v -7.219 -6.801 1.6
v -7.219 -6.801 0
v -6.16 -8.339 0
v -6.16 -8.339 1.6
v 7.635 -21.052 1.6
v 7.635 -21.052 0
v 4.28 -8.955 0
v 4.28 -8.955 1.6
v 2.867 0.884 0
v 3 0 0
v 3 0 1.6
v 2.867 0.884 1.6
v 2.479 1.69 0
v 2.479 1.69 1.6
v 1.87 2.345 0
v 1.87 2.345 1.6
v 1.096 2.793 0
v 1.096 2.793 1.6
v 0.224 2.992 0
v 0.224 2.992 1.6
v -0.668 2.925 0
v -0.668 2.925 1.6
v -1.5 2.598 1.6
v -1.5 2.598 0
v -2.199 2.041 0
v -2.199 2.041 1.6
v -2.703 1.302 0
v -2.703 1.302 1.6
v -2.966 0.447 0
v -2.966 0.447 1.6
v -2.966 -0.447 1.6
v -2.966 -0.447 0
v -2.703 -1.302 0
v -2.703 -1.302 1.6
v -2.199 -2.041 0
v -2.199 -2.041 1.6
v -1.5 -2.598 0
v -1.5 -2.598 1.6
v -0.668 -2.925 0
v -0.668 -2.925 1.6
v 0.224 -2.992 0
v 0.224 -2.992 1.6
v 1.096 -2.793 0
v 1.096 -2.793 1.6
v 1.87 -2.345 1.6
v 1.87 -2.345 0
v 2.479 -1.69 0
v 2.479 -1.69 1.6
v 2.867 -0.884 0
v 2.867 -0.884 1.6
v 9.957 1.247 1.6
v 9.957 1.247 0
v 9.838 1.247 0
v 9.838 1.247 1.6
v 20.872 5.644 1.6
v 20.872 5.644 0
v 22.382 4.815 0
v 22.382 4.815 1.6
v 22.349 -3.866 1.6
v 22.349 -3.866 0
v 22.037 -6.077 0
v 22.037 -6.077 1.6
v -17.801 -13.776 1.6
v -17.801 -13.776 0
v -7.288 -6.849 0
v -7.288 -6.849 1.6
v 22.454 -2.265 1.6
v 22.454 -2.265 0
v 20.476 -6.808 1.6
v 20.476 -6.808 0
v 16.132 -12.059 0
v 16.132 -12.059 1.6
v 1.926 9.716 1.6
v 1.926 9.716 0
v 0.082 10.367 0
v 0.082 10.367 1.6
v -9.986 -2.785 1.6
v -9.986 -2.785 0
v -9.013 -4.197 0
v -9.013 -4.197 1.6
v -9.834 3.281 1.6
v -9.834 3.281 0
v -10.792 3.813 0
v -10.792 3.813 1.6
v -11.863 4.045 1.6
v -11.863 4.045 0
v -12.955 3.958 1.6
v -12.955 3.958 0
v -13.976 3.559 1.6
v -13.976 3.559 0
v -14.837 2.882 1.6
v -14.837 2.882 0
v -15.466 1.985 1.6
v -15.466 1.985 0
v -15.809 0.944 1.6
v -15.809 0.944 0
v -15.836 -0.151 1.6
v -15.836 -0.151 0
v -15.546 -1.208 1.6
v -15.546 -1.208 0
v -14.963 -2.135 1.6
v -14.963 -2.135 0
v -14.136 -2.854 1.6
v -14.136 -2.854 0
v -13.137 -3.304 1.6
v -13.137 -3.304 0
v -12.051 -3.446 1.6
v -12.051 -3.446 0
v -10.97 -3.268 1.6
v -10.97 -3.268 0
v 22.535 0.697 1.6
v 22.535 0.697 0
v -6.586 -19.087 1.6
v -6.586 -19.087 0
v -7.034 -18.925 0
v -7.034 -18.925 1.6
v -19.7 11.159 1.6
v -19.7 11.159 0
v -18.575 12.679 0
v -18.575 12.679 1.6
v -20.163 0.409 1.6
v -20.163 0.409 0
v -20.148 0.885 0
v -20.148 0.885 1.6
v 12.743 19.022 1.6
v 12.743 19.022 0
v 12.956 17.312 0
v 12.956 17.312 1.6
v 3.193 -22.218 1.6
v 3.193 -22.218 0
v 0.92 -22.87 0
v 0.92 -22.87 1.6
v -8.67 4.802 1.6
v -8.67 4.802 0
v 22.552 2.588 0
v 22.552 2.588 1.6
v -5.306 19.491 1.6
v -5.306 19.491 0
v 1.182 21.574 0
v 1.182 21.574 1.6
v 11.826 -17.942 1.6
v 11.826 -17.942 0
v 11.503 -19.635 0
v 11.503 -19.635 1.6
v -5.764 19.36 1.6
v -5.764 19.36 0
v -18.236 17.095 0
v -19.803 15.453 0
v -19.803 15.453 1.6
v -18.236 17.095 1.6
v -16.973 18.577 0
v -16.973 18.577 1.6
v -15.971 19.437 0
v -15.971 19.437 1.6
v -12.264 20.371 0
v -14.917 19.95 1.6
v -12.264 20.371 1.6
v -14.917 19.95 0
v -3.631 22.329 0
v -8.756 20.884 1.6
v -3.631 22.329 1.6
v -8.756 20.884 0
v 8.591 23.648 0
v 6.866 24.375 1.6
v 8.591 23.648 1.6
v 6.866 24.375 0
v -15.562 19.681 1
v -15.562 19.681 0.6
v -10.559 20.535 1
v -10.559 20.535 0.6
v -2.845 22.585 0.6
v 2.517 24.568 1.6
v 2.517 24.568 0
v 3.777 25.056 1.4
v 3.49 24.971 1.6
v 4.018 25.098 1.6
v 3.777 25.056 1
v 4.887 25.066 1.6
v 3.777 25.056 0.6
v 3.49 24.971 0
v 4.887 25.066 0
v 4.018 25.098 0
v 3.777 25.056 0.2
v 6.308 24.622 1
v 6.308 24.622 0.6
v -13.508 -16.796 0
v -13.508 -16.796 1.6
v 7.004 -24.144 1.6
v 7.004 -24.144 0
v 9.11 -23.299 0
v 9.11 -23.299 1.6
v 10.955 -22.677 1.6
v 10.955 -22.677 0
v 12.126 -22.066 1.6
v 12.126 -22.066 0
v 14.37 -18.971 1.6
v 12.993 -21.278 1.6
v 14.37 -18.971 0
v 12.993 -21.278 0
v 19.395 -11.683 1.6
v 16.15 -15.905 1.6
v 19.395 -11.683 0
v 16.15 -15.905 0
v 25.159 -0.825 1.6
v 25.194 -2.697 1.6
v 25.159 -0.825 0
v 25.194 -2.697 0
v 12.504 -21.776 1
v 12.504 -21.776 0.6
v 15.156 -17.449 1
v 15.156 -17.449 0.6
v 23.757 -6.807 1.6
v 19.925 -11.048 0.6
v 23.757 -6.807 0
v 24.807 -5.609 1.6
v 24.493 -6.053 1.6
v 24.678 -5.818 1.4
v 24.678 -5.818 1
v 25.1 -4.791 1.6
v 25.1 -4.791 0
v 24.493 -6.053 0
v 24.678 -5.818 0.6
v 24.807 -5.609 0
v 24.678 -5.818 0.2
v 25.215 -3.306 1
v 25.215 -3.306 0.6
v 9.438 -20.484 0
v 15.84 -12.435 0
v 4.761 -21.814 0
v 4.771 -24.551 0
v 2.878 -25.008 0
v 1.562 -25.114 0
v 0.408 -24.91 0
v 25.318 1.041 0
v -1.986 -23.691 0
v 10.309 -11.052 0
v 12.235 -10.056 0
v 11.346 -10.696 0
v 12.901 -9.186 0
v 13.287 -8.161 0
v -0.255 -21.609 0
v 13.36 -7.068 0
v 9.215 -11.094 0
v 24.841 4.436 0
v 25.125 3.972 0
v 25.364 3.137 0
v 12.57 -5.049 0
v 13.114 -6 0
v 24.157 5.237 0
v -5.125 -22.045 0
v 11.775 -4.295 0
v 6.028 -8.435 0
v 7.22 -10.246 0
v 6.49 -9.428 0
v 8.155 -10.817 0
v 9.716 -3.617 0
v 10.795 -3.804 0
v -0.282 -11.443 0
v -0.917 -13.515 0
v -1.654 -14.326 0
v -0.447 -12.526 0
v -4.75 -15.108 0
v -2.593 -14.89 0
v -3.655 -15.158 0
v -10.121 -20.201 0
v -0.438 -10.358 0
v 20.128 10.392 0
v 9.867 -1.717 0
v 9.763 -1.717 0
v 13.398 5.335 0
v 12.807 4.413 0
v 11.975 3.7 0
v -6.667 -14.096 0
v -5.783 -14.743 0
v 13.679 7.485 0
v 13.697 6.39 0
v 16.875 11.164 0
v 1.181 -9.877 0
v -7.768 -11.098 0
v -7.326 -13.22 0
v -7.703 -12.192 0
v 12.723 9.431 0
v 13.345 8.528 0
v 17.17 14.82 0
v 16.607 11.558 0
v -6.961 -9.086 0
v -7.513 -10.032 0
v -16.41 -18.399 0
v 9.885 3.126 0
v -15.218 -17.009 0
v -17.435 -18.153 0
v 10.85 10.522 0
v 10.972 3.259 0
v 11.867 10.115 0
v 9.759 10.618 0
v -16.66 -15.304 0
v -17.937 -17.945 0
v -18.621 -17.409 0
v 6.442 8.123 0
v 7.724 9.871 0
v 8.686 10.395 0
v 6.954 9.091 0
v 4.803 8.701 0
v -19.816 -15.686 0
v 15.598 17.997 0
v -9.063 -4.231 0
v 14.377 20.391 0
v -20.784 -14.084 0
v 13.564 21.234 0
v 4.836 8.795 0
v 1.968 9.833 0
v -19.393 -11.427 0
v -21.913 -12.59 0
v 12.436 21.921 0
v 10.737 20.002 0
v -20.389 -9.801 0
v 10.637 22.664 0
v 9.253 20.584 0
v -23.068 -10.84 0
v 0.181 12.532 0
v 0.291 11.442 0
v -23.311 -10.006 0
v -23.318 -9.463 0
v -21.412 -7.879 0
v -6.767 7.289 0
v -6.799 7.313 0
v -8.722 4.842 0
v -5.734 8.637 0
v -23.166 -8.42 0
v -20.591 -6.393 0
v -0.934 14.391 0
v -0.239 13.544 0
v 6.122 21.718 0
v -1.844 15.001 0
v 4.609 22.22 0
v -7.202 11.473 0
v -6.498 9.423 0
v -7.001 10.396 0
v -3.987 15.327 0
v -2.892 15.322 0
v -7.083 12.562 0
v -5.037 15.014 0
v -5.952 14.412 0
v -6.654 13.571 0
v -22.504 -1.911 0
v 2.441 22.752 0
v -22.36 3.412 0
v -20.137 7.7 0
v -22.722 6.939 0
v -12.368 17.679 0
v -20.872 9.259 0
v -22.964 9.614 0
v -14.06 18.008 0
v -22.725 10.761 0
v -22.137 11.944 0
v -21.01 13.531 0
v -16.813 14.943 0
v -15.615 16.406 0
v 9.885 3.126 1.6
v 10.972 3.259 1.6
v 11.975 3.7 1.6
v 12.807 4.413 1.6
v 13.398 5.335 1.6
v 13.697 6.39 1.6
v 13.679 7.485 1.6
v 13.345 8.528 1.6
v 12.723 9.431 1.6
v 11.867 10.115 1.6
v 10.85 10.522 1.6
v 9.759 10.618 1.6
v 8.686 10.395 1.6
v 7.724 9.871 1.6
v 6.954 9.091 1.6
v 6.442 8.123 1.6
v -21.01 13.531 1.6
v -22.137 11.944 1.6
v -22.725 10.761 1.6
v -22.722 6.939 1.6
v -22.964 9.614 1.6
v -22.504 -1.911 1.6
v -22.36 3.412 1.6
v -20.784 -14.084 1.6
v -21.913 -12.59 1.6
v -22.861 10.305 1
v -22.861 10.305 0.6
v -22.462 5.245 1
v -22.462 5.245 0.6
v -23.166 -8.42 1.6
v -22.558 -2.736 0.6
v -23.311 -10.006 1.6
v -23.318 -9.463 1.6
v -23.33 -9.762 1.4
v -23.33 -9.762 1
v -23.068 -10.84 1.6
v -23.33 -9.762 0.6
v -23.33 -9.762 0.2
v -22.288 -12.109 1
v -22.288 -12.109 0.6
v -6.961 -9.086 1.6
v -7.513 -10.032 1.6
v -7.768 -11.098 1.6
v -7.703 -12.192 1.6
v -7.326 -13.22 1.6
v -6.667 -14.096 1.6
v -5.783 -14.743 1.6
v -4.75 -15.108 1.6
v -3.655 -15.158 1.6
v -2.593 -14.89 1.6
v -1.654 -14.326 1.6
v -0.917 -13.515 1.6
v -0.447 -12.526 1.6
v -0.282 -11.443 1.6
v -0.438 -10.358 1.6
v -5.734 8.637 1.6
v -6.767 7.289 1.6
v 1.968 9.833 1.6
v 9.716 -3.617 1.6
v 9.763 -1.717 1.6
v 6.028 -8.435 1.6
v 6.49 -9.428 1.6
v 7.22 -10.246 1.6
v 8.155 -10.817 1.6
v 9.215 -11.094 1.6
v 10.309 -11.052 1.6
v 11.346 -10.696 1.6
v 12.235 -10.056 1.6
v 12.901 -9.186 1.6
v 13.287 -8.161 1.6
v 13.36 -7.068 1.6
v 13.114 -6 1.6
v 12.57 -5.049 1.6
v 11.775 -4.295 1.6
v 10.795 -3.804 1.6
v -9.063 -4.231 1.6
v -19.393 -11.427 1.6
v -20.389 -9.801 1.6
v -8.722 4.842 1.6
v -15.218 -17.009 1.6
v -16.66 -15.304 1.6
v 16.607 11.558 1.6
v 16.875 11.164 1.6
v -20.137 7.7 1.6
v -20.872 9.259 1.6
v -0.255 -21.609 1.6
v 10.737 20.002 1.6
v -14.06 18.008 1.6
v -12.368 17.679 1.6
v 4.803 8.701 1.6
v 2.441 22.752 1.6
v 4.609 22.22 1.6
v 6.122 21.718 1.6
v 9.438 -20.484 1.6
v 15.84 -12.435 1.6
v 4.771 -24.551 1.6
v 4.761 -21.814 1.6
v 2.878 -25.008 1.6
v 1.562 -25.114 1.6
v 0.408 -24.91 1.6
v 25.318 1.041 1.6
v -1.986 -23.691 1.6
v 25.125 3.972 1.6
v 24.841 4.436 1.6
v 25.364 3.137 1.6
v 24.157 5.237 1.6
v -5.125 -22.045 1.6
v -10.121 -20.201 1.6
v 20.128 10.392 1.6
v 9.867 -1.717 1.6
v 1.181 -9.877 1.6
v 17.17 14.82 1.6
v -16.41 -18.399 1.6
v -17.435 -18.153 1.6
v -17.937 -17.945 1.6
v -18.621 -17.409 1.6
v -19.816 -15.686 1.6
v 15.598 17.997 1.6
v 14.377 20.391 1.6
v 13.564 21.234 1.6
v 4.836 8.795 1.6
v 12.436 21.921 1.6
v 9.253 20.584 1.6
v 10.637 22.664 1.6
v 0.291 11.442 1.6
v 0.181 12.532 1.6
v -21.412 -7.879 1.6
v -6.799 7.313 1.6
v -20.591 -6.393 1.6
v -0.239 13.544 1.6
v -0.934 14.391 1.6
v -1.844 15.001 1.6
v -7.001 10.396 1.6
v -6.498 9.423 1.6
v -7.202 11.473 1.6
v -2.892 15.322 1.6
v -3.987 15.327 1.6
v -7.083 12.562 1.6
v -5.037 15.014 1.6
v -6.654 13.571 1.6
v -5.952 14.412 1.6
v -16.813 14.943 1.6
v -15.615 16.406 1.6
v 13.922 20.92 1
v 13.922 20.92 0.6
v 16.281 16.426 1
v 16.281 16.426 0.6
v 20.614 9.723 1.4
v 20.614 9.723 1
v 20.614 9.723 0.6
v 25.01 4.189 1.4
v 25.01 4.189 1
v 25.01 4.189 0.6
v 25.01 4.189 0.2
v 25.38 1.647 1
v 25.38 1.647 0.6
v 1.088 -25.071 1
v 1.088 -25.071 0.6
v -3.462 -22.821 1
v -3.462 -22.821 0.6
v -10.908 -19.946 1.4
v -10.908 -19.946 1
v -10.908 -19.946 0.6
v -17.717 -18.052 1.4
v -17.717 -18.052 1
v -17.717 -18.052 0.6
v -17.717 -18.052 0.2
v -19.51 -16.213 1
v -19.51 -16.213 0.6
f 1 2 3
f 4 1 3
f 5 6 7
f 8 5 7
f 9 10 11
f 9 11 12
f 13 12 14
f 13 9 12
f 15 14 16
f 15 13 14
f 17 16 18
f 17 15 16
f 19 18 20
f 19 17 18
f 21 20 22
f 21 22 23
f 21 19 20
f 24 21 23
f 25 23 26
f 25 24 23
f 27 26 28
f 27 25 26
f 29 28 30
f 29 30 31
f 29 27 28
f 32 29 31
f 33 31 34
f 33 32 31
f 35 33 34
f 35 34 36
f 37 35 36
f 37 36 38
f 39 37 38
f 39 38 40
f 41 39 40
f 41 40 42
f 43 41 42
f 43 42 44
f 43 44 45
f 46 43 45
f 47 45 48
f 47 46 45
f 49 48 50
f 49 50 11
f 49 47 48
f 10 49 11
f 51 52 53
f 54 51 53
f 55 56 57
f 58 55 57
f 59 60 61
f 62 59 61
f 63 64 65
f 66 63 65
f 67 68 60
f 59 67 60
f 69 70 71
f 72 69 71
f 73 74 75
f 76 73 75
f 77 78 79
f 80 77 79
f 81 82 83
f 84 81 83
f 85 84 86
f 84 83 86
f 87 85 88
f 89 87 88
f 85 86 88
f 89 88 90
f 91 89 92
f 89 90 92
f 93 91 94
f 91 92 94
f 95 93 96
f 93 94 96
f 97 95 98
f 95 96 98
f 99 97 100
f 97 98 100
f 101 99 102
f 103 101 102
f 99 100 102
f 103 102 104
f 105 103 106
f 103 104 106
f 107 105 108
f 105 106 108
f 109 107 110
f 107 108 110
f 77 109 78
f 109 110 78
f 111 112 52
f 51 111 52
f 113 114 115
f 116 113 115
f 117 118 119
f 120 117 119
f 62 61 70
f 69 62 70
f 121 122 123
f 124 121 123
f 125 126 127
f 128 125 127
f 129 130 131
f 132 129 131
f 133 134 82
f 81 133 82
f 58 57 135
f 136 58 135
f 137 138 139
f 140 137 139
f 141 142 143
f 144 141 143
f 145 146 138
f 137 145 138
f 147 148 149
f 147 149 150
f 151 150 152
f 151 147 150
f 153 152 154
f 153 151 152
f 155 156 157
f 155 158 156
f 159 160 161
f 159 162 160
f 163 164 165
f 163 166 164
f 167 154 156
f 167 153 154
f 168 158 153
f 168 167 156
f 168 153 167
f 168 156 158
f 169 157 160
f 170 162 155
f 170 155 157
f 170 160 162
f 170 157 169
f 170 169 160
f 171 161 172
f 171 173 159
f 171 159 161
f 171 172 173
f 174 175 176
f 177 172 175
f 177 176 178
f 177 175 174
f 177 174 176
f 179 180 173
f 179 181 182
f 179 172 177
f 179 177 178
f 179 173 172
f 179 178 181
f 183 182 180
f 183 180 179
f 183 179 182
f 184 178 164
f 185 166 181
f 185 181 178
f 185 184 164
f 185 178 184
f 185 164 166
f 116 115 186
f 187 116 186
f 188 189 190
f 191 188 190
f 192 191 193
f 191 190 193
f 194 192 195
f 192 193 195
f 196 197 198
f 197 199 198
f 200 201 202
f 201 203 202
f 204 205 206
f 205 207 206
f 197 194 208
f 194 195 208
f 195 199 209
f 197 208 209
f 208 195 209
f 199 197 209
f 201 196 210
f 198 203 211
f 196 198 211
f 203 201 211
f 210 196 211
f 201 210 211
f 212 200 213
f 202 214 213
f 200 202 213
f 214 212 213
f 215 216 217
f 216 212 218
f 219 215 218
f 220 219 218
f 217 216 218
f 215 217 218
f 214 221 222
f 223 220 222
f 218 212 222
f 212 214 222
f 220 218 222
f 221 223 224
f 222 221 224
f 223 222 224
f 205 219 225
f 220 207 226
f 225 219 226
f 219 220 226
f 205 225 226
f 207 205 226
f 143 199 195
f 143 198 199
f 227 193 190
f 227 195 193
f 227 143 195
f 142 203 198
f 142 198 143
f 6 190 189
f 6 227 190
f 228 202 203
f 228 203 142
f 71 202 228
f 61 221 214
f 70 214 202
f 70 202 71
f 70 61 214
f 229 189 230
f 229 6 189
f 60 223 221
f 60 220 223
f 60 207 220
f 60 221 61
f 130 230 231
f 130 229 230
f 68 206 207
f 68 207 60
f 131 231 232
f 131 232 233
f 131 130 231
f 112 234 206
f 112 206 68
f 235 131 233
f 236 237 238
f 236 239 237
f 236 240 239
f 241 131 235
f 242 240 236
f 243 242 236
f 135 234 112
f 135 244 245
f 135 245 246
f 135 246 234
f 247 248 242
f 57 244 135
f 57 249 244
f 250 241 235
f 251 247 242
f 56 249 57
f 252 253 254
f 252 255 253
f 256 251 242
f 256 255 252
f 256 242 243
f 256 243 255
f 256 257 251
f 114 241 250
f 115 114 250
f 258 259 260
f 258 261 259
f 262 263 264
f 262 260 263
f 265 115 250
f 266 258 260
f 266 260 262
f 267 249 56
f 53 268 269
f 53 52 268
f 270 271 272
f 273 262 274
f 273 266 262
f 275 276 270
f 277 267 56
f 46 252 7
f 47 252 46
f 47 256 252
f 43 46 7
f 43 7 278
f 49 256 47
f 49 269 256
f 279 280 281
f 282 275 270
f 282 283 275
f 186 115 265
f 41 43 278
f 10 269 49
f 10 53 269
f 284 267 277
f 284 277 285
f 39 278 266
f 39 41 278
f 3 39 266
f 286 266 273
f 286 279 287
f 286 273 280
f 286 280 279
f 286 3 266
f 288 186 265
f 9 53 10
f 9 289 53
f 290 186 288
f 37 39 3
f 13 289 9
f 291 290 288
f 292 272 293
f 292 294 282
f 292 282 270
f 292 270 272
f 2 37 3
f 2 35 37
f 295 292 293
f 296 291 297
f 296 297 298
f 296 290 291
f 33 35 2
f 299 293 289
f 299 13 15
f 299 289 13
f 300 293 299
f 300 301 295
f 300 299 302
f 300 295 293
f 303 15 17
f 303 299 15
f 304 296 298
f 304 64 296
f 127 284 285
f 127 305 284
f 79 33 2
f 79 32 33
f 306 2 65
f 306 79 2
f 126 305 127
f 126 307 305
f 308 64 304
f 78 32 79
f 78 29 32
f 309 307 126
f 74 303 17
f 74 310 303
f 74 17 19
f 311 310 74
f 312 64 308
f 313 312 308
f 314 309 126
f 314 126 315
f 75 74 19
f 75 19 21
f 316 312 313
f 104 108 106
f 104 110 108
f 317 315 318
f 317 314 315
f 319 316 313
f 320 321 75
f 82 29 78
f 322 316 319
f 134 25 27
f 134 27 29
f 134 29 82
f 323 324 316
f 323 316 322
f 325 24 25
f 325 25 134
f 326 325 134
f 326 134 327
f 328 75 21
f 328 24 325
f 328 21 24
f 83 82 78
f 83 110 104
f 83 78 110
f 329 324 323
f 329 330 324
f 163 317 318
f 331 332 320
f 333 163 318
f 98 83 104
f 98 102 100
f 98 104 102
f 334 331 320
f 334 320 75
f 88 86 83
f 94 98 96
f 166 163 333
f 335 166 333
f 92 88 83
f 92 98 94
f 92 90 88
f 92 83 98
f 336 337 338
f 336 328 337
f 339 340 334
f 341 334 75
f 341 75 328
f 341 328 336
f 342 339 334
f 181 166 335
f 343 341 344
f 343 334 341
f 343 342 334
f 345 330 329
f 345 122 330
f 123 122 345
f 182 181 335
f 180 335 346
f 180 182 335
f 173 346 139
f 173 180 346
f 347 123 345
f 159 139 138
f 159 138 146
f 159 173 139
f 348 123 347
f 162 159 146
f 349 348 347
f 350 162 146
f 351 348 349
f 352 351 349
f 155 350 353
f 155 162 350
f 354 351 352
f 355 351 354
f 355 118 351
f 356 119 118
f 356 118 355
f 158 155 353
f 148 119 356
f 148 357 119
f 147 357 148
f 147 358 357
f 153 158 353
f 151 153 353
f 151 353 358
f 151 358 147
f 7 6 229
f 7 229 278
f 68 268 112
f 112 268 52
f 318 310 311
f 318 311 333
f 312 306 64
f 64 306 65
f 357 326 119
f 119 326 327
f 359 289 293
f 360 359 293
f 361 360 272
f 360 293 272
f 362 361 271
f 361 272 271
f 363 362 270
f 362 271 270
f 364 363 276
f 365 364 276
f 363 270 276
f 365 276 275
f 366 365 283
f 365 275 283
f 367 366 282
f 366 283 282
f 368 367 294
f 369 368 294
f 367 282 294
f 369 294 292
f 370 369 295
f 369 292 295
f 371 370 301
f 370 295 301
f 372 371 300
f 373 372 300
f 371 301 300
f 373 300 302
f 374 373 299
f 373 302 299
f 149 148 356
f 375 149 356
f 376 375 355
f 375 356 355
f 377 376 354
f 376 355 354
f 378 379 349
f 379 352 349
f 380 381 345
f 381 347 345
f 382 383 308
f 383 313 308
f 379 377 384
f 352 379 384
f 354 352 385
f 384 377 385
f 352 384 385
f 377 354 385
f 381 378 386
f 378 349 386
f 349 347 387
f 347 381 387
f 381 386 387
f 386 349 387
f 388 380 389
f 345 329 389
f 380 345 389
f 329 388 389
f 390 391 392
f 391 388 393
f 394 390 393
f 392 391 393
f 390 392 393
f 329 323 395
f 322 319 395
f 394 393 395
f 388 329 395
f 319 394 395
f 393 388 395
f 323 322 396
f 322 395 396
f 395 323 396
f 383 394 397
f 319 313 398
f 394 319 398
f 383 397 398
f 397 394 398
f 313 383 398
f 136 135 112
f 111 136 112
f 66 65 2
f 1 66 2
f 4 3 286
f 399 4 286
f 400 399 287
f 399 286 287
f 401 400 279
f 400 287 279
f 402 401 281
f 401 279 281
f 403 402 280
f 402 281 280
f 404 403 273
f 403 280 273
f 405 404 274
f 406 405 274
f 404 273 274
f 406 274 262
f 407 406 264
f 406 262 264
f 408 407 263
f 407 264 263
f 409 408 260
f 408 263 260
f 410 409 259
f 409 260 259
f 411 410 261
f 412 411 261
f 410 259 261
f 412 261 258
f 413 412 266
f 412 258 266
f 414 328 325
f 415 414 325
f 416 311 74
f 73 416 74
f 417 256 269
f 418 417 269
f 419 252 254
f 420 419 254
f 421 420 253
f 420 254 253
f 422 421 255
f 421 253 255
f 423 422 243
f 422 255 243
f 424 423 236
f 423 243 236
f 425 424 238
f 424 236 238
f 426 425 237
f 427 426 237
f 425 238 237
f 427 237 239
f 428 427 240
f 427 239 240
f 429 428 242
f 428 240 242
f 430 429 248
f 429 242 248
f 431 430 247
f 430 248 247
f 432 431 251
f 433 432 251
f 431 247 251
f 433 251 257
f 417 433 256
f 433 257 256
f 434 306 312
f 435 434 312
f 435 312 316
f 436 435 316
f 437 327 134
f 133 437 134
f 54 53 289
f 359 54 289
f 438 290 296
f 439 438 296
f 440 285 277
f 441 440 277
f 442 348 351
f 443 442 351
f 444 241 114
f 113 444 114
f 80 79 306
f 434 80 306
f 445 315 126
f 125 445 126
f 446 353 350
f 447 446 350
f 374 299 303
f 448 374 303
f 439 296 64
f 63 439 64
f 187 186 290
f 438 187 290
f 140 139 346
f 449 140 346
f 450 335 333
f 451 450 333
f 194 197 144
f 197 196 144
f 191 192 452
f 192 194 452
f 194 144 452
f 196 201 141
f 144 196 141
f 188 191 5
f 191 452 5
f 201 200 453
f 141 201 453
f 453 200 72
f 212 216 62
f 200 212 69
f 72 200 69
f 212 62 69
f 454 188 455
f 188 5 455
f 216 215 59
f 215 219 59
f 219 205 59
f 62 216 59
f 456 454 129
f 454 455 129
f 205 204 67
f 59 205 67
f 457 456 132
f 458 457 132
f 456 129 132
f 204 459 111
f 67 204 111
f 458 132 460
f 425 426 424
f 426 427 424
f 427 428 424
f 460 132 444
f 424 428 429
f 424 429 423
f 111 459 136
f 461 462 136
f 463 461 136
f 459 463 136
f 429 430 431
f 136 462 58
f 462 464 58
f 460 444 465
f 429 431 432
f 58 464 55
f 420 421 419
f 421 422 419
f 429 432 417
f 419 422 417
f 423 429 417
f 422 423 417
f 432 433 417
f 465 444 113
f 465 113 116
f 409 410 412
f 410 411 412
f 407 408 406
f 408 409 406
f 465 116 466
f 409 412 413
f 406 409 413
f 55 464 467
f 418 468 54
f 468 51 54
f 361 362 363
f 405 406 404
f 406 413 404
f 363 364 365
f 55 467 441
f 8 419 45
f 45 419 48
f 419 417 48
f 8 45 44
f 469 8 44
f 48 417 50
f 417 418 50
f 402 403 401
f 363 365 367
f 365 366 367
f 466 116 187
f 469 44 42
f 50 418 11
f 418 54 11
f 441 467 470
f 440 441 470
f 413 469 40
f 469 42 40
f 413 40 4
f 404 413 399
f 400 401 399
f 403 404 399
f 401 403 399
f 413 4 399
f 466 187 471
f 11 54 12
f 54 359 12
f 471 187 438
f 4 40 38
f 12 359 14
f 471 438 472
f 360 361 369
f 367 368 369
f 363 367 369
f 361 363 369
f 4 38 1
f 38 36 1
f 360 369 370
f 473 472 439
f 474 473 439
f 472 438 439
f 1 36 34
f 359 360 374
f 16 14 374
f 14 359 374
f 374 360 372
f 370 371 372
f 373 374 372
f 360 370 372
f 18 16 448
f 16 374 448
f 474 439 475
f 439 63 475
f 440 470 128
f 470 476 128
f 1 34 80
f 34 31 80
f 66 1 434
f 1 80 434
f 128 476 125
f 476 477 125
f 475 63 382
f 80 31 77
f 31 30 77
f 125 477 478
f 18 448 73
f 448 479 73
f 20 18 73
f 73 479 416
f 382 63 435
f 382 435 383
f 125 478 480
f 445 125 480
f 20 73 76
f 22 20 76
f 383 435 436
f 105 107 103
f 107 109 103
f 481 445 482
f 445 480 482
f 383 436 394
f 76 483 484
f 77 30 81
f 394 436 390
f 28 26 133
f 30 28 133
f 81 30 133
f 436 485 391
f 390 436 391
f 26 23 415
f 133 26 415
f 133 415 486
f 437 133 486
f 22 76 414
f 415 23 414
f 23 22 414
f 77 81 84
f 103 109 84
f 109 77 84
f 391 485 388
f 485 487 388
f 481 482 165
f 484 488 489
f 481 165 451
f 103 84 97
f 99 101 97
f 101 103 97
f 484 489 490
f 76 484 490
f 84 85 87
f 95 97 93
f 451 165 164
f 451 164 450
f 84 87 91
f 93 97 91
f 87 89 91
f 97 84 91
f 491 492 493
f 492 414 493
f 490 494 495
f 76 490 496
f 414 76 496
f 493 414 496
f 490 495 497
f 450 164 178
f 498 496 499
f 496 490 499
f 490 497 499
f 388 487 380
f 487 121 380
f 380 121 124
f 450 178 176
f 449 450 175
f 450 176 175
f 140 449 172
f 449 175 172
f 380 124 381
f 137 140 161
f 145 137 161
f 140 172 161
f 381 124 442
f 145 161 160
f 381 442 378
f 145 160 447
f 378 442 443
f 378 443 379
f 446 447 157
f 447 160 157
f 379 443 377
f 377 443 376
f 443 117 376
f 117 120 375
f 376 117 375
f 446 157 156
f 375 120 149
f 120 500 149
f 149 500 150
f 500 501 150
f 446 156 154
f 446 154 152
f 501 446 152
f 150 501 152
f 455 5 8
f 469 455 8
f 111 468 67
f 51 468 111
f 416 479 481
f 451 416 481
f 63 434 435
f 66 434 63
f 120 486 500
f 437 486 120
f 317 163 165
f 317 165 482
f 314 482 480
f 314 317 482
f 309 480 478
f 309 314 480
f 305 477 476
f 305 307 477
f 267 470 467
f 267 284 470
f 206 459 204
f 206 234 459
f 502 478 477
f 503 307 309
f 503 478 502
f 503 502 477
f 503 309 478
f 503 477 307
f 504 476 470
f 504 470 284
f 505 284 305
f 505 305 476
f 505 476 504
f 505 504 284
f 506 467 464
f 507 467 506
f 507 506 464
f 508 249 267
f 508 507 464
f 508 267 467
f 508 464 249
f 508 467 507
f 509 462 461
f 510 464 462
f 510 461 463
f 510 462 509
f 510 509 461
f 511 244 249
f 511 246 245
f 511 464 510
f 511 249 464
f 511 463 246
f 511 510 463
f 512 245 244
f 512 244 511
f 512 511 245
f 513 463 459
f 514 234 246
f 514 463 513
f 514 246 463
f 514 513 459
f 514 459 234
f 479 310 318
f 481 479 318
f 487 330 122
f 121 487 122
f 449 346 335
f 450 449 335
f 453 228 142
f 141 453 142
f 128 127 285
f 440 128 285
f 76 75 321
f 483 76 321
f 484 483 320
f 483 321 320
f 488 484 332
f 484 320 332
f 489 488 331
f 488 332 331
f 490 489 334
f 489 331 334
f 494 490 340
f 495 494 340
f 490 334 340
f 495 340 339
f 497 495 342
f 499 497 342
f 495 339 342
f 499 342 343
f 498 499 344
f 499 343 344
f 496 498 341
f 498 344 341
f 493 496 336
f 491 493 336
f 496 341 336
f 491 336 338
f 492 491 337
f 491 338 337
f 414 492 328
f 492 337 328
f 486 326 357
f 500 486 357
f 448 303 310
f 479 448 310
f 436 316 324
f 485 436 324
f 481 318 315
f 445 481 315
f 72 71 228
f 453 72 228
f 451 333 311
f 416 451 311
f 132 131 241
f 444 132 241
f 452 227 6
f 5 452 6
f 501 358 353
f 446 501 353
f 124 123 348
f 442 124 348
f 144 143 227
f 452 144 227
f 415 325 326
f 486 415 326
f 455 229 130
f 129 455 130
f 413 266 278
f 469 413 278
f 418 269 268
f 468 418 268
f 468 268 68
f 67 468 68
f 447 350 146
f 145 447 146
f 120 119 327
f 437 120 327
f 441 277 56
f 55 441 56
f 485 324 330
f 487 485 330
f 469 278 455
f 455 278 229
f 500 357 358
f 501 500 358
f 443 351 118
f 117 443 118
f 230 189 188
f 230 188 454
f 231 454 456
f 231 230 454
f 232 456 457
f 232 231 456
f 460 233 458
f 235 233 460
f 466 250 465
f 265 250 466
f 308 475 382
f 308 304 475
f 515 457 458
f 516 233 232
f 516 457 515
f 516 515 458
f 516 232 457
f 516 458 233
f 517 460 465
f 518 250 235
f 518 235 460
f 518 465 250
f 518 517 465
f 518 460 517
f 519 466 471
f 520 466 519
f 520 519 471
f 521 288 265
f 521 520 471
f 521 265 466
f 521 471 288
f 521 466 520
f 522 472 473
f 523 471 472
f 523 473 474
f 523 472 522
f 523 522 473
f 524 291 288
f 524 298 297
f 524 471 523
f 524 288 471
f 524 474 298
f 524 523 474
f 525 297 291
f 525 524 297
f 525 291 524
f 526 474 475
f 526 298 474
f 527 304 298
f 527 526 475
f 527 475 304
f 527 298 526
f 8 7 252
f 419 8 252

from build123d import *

# Parameters (mm, degrees)
SKETCH1_R           = 3
BOSS_EXTRUDE1_DEPTH = 1.6


with BuildPart() as part:
    # Sketch1 → Boss-Extrude1 (new body)
    with BuildSketch(Plane.XY):
        with BuildLine():
            add(Edge.make_bspline(
                [(-19.803359715, 15.453419311), (-18.405947529, 16.480598176), (-16.865662186, 19.732795688), (-13.080130181, 20.35145444), (-10.552712302, 20.453881039), (-7.10879258, 21.264944161), (-2.653848069, 22.580943494), (1.471145086, 24.09546527), (5.038822654, 25.670890535), (7.324131038, 23.998569775), (8.591411433, 23.647907344)],
                knots=[0, 0, 0, 0, 0.190521612, 0.271147793, 0.35187009, 0.432694495, 0.605069532, 0.800340174, 0.829757563, 1, 1, 1, 1], degree=3))
            add(Edge.make_bspline(
                [(-19.803359715, 15.453419311), (-20.456487654, 13.846782721), (-23.231656968, 11.555996203), (-22.903102354, 7.734341708), (-22.382604891, 5.258980172), (-22.324352891, 1.721323724), (-22.507686222, -2.920311088), (-22.964393827, -7.290753046), (-23.616815258, -11.135832274), (-21.435134382, -12.941257344), (-20.78440531, -14.083848879)],
                knots=[0, 0, 0, 0, 0.190521612, 0.271147793, 0.35187009, 0.432694495, 0.605069532, 0.800340174, 0.829757563, 1, 1, 1, 1], degree=3))
            add(Edge.make_bspline(
                [(7.004046315, -24.144396523), (5.269755521, -24.154023407), (2.112044767, -25.879749455), (-1.314153448, -24.155175014), (-3.419082308, -22.752460918), (-6.682002832, -21.384339544), (-11.059653651, -19.830454685), (-15.287056779, -18.631118398), (-19.099380299, -17.808635952), (-19.965268139, -15.112429472), (-20.78440531, -14.083848879)],
                knots=[0, 0, 0, 0, 0.190521612, 0.271147793, 0.35187009, 0.432694495, 0.605069532, 0.800340174, 0.829757563, 1, 1, 1, 1], degree=3))
            add(Edge.make_bspline(
                [(7.004046315, -24.144396523), (8.476795211, -23.228499189), (12.06844488, -23.006417561), (14.048950766, -19.721514571), (15.082840477, -17.412964288), (17.115095907, -14.516700435), (19.991700177, -10.869299619), (22.93006572, -7.601983797), (25.717966609, -4.874733052), (25.014151934, -2.131753644), (25.15929951, -0.824888722)],
                knots=[0, 0, 0, 0, 0.190521612, 0.271147793, 0.35187009, 0.432694495, 0.605069532, 0.800340174, 0.829757563, 1, 1, 1, 1], degree=3))
            add(Edge.make_bspline(
                [(8.591411433, 23.647907344), (10.000140699, 22.636305104), (13.569138682, 22.176390993), (15.327311842, 18.767312179), (16.205740403, 16.395246496), (18.041336991, 13.370516491), (20.669580295, 9.540278642), (23.384669086, 6.085189989), (25.985460549, 3.17896017), (25.101188121, 0.488727206), (25.15929951, -0.824888722)],
                knots=[0, 0, 0, 0, 0.190521612, 0.271147793, 0.35187009, 0.432694495, 0.605069532, 0.800340174, 0.829757563, 1, 1, 1, 1], degree=3))
        make_face()
        with BuildLine():
            Line((-17.801162623, -13.775916995), (-7.288377194, -6.849035991))
            Line((-7.288377194, -6.849035991), (-7.219097449, -6.80130634))
            Line((-7.219097449, -6.80130634), (-6.159615012, -8.339148545))
            ThreePointArc((-6.159615012, -8.339148545), (-5.27990407, -14.963540508), (-0.437739512, -10.358119505))
            Line((-0.437739512, -10.358119505), (1.180640518, -9.876749677))
            Line((1.180640518, -9.876749677), (4.761279199, -21.814031949))
            Line((4.761279199, -21.814031949), (3.192860098, -22.21819377))
            Line((3.192860098, -22.21819377), (0.919751527, -22.870102125))
            Line((0.919751527, -22.870102125), (-0.254910052, -21.60919454))
            Line((-0.254910052, -21.60919454), (-6.586009521, -19.087490005))
            Line((-6.586009521, -19.087490005), (-7.033888934, -18.924819298))
            Line((-7.033888934, -18.924819298), (-13.507608069, -16.79578787))
            Line((-13.507608069, -16.79578787), (-15.217659106, -17.00896201))
            Line((-15.217659106, -17.00896201), (-16.659623067, -15.304131809))
            Line((-16.659623067, -15.304131809), (-17.801162623, -13.775916995))
        make_face(mode=Mode.SUBTRACT)
        with BuildLine():
            Line((7.634790842, -21.052282346), (4.280200388, -8.954818752))
            Line((4.280200388, -8.954818752), (6.027575847, -8.435080614))
            ThreePointArc((6.027575847, -8.435080614), (12.599592621, -9.645475484), (9.715888103, -3.617149972))
            Line((9.715888103, -3.617149972), (9.763492876, -1.717414351))
            Line((9.763492876, -1.717414351), (9.866614215, -1.717414351))
            Line((9.866614215, -1.717414351), (22.45361097, -2.264716527))
            Line((22.45361097, -2.264716527), (22.348565614, -3.865907691))
            Line((22.348565614, -3.865907691), (22.036670653, -6.076886573))
            Line((22.036670653, -6.076886573), (20.475982717, -6.807619719))
            Line((20.475982717, -6.807619719), (16.132052278, -12.058532267))
            Line((16.132052278, -12.058532267), (15.839712763, -12.434823824))
            Line((15.839712763, -12.434823824), (11.825691605, -17.942041668))
            Line((11.825691605, -17.942041668), (11.503472084, -19.634936333))
            Line((11.503472084, -19.634936333), (9.438229008, -20.483745566))
            Line((9.438229008, -20.483745566), (7.634790842, -21.052282346))
        make_face(mode=Mode.SUBTRACT)
        with BuildLine():
            Line((-9.013454275, -4.196791566), (-9.062625773, -4.230667824))
            Line((-9.062625773, -4.230667824), (-19.392672935, -11.42722697))
            Line((-19.392672935, -11.42722697), (-20.388928576, -9.800565427))
            Line((-20.388928576, -9.800565427), (-21.411625147, -7.878730903))
            Line((-21.411625147, -7.878730903), (-20.590871671, -6.392578193))
            Line((-20.590871671, -6.392578193), (-20.16296708, 0.408797543))
            Line((-20.16296708, 0.408797543), (-20.147638072, 0.885056663))
            Line((-20.147638072, 0.885056663), (-20.137288169, 7.699871931))
            Line((-20.137288169, 7.699871931), (-20.871665619, 9.258848366))
            Line((-20.871665619, 9.258848366), (-19.699766422, 11.159468884))
            Line((-19.699766422, 11.159468884), (-18.574931832, 12.679459157))
            Line((-18.574931832, 12.679459157), (-8.722336792, 4.841939849))
            Line((-8.722336792, 4.841939849), (-8.670186056, 4.802016443))
            Line((-8.670186056, 4.802016443), (-9.834427282, 3.281203376))
            ThreePointArc((-9.834427282, 3.281203376), (-15.862752793, 0.397498858), (-9.986426, -2.784519941))
            Line((-9.986426, -2.784519941), (-9.013454275, -4.196791566))
        make_face(mode=Mode.SUBTRACT)
        Circle(SKETCH1_R, mode=Mode.SUBTRACT)
        with BuildLine():
            Line((6.121522806, 21.717593523), (1.967710182, 9.833109359))
            Line((1.967710182, 9.833109359), (1.926422403, 9.716097508))
            Line((1.926422403, 9.716097508), (0.081604692, 10.367043755))
            ThreePointArc((0.081604692, 10.367043755), (-4.523816312, 15.209208313), (-5.734211182, 8.637191539))
            Line((-5.734211182, 8.637191539), (-6.766621458, 7.288585249))
            Line((-6.766621458, 7.288585249), (-6.798510611, 7.312997629))
            Line((-6.798510611, 7.312997629), (-16.812855722, 14.94275712))
            Line((-16.812855722, 14.94275712), (-15.615120331, 16.405990943))
            Line((-15.615120331, 16.405990943), (-14.059918796, 18.008193884))
            Line((-14.059918796, 18.008193884), (-12.368454733, 17.678546972))
            Line((-12.368454733, 17.678546972), (-5.764266933, 19.359772047))
            Line((-5.764266933, 19.359772047), (-5.306309433, 19.491425595))
            Line((-5.306309433, 19.491425595), (1.182452638, 21.574159623))
            Line((1.182452638, 21.574159623), (2.440612373, 22.751763906))
            Line((2.440612373, 22.751763906), (4.609259773, 22.220092452))
            Line((4.609259773, 22.220092452), (6.121522806, 21.717593523))
        make_face(mode=Mode.SUBTRACT)
        with BuildLine():
            Line((22.534987607, 0.697240391), (9.957292517, 1.246716644))
            Line((9.957292517, 1.246716644), (9.837769938, 1.246716644))
            Line((9.837769938, 1.246716644), (9.884861755, 3.125982028))
            ThreePointArc((9.884861755, 3.125982028), (13.066880554, 9.002308821), (6.442488591, 8.122597879))
            Line((6.442488591, 8.122597879), (4.803089909, 8.701061764))
            Line((4.803089909, 8.701061764), (4.836106759, 8.794633347))
            Line((4.836106759, 8.794633347), (9.253126228, 20.583825947))
            Line((9.253126228, 20.583825947), (10.736580456, 20.001753607))
            Line((10.736580456, 20.001753607), (12.742965485, 19.021893824))
            Line((12.742965485, 19.021893824), (12.95565491, 17.311782432))
            Line((12.95565491, 17.311782432), (16.607221178, 11.557837868))
            Line((16.607221178, 11.557837868), (16.874757837, 11.163525981))
            Line((16.874757837, 11.163525981), (20.872032501, 5.644141096))
            Line((20.872032501, 5.644141096), (22.382499695, 4.814558901))
            Line((22.382499695, 4.814558901), (22.55157004, 2.588099537))
            Line((22.55157004, 2.588099537), (22.534987607, 0.697240391))
        make_face(mode=Mode.SUBTRACT)
    extrude(amount=BOSS_EXTRUDE1_DEPTH)


solid = part.part
